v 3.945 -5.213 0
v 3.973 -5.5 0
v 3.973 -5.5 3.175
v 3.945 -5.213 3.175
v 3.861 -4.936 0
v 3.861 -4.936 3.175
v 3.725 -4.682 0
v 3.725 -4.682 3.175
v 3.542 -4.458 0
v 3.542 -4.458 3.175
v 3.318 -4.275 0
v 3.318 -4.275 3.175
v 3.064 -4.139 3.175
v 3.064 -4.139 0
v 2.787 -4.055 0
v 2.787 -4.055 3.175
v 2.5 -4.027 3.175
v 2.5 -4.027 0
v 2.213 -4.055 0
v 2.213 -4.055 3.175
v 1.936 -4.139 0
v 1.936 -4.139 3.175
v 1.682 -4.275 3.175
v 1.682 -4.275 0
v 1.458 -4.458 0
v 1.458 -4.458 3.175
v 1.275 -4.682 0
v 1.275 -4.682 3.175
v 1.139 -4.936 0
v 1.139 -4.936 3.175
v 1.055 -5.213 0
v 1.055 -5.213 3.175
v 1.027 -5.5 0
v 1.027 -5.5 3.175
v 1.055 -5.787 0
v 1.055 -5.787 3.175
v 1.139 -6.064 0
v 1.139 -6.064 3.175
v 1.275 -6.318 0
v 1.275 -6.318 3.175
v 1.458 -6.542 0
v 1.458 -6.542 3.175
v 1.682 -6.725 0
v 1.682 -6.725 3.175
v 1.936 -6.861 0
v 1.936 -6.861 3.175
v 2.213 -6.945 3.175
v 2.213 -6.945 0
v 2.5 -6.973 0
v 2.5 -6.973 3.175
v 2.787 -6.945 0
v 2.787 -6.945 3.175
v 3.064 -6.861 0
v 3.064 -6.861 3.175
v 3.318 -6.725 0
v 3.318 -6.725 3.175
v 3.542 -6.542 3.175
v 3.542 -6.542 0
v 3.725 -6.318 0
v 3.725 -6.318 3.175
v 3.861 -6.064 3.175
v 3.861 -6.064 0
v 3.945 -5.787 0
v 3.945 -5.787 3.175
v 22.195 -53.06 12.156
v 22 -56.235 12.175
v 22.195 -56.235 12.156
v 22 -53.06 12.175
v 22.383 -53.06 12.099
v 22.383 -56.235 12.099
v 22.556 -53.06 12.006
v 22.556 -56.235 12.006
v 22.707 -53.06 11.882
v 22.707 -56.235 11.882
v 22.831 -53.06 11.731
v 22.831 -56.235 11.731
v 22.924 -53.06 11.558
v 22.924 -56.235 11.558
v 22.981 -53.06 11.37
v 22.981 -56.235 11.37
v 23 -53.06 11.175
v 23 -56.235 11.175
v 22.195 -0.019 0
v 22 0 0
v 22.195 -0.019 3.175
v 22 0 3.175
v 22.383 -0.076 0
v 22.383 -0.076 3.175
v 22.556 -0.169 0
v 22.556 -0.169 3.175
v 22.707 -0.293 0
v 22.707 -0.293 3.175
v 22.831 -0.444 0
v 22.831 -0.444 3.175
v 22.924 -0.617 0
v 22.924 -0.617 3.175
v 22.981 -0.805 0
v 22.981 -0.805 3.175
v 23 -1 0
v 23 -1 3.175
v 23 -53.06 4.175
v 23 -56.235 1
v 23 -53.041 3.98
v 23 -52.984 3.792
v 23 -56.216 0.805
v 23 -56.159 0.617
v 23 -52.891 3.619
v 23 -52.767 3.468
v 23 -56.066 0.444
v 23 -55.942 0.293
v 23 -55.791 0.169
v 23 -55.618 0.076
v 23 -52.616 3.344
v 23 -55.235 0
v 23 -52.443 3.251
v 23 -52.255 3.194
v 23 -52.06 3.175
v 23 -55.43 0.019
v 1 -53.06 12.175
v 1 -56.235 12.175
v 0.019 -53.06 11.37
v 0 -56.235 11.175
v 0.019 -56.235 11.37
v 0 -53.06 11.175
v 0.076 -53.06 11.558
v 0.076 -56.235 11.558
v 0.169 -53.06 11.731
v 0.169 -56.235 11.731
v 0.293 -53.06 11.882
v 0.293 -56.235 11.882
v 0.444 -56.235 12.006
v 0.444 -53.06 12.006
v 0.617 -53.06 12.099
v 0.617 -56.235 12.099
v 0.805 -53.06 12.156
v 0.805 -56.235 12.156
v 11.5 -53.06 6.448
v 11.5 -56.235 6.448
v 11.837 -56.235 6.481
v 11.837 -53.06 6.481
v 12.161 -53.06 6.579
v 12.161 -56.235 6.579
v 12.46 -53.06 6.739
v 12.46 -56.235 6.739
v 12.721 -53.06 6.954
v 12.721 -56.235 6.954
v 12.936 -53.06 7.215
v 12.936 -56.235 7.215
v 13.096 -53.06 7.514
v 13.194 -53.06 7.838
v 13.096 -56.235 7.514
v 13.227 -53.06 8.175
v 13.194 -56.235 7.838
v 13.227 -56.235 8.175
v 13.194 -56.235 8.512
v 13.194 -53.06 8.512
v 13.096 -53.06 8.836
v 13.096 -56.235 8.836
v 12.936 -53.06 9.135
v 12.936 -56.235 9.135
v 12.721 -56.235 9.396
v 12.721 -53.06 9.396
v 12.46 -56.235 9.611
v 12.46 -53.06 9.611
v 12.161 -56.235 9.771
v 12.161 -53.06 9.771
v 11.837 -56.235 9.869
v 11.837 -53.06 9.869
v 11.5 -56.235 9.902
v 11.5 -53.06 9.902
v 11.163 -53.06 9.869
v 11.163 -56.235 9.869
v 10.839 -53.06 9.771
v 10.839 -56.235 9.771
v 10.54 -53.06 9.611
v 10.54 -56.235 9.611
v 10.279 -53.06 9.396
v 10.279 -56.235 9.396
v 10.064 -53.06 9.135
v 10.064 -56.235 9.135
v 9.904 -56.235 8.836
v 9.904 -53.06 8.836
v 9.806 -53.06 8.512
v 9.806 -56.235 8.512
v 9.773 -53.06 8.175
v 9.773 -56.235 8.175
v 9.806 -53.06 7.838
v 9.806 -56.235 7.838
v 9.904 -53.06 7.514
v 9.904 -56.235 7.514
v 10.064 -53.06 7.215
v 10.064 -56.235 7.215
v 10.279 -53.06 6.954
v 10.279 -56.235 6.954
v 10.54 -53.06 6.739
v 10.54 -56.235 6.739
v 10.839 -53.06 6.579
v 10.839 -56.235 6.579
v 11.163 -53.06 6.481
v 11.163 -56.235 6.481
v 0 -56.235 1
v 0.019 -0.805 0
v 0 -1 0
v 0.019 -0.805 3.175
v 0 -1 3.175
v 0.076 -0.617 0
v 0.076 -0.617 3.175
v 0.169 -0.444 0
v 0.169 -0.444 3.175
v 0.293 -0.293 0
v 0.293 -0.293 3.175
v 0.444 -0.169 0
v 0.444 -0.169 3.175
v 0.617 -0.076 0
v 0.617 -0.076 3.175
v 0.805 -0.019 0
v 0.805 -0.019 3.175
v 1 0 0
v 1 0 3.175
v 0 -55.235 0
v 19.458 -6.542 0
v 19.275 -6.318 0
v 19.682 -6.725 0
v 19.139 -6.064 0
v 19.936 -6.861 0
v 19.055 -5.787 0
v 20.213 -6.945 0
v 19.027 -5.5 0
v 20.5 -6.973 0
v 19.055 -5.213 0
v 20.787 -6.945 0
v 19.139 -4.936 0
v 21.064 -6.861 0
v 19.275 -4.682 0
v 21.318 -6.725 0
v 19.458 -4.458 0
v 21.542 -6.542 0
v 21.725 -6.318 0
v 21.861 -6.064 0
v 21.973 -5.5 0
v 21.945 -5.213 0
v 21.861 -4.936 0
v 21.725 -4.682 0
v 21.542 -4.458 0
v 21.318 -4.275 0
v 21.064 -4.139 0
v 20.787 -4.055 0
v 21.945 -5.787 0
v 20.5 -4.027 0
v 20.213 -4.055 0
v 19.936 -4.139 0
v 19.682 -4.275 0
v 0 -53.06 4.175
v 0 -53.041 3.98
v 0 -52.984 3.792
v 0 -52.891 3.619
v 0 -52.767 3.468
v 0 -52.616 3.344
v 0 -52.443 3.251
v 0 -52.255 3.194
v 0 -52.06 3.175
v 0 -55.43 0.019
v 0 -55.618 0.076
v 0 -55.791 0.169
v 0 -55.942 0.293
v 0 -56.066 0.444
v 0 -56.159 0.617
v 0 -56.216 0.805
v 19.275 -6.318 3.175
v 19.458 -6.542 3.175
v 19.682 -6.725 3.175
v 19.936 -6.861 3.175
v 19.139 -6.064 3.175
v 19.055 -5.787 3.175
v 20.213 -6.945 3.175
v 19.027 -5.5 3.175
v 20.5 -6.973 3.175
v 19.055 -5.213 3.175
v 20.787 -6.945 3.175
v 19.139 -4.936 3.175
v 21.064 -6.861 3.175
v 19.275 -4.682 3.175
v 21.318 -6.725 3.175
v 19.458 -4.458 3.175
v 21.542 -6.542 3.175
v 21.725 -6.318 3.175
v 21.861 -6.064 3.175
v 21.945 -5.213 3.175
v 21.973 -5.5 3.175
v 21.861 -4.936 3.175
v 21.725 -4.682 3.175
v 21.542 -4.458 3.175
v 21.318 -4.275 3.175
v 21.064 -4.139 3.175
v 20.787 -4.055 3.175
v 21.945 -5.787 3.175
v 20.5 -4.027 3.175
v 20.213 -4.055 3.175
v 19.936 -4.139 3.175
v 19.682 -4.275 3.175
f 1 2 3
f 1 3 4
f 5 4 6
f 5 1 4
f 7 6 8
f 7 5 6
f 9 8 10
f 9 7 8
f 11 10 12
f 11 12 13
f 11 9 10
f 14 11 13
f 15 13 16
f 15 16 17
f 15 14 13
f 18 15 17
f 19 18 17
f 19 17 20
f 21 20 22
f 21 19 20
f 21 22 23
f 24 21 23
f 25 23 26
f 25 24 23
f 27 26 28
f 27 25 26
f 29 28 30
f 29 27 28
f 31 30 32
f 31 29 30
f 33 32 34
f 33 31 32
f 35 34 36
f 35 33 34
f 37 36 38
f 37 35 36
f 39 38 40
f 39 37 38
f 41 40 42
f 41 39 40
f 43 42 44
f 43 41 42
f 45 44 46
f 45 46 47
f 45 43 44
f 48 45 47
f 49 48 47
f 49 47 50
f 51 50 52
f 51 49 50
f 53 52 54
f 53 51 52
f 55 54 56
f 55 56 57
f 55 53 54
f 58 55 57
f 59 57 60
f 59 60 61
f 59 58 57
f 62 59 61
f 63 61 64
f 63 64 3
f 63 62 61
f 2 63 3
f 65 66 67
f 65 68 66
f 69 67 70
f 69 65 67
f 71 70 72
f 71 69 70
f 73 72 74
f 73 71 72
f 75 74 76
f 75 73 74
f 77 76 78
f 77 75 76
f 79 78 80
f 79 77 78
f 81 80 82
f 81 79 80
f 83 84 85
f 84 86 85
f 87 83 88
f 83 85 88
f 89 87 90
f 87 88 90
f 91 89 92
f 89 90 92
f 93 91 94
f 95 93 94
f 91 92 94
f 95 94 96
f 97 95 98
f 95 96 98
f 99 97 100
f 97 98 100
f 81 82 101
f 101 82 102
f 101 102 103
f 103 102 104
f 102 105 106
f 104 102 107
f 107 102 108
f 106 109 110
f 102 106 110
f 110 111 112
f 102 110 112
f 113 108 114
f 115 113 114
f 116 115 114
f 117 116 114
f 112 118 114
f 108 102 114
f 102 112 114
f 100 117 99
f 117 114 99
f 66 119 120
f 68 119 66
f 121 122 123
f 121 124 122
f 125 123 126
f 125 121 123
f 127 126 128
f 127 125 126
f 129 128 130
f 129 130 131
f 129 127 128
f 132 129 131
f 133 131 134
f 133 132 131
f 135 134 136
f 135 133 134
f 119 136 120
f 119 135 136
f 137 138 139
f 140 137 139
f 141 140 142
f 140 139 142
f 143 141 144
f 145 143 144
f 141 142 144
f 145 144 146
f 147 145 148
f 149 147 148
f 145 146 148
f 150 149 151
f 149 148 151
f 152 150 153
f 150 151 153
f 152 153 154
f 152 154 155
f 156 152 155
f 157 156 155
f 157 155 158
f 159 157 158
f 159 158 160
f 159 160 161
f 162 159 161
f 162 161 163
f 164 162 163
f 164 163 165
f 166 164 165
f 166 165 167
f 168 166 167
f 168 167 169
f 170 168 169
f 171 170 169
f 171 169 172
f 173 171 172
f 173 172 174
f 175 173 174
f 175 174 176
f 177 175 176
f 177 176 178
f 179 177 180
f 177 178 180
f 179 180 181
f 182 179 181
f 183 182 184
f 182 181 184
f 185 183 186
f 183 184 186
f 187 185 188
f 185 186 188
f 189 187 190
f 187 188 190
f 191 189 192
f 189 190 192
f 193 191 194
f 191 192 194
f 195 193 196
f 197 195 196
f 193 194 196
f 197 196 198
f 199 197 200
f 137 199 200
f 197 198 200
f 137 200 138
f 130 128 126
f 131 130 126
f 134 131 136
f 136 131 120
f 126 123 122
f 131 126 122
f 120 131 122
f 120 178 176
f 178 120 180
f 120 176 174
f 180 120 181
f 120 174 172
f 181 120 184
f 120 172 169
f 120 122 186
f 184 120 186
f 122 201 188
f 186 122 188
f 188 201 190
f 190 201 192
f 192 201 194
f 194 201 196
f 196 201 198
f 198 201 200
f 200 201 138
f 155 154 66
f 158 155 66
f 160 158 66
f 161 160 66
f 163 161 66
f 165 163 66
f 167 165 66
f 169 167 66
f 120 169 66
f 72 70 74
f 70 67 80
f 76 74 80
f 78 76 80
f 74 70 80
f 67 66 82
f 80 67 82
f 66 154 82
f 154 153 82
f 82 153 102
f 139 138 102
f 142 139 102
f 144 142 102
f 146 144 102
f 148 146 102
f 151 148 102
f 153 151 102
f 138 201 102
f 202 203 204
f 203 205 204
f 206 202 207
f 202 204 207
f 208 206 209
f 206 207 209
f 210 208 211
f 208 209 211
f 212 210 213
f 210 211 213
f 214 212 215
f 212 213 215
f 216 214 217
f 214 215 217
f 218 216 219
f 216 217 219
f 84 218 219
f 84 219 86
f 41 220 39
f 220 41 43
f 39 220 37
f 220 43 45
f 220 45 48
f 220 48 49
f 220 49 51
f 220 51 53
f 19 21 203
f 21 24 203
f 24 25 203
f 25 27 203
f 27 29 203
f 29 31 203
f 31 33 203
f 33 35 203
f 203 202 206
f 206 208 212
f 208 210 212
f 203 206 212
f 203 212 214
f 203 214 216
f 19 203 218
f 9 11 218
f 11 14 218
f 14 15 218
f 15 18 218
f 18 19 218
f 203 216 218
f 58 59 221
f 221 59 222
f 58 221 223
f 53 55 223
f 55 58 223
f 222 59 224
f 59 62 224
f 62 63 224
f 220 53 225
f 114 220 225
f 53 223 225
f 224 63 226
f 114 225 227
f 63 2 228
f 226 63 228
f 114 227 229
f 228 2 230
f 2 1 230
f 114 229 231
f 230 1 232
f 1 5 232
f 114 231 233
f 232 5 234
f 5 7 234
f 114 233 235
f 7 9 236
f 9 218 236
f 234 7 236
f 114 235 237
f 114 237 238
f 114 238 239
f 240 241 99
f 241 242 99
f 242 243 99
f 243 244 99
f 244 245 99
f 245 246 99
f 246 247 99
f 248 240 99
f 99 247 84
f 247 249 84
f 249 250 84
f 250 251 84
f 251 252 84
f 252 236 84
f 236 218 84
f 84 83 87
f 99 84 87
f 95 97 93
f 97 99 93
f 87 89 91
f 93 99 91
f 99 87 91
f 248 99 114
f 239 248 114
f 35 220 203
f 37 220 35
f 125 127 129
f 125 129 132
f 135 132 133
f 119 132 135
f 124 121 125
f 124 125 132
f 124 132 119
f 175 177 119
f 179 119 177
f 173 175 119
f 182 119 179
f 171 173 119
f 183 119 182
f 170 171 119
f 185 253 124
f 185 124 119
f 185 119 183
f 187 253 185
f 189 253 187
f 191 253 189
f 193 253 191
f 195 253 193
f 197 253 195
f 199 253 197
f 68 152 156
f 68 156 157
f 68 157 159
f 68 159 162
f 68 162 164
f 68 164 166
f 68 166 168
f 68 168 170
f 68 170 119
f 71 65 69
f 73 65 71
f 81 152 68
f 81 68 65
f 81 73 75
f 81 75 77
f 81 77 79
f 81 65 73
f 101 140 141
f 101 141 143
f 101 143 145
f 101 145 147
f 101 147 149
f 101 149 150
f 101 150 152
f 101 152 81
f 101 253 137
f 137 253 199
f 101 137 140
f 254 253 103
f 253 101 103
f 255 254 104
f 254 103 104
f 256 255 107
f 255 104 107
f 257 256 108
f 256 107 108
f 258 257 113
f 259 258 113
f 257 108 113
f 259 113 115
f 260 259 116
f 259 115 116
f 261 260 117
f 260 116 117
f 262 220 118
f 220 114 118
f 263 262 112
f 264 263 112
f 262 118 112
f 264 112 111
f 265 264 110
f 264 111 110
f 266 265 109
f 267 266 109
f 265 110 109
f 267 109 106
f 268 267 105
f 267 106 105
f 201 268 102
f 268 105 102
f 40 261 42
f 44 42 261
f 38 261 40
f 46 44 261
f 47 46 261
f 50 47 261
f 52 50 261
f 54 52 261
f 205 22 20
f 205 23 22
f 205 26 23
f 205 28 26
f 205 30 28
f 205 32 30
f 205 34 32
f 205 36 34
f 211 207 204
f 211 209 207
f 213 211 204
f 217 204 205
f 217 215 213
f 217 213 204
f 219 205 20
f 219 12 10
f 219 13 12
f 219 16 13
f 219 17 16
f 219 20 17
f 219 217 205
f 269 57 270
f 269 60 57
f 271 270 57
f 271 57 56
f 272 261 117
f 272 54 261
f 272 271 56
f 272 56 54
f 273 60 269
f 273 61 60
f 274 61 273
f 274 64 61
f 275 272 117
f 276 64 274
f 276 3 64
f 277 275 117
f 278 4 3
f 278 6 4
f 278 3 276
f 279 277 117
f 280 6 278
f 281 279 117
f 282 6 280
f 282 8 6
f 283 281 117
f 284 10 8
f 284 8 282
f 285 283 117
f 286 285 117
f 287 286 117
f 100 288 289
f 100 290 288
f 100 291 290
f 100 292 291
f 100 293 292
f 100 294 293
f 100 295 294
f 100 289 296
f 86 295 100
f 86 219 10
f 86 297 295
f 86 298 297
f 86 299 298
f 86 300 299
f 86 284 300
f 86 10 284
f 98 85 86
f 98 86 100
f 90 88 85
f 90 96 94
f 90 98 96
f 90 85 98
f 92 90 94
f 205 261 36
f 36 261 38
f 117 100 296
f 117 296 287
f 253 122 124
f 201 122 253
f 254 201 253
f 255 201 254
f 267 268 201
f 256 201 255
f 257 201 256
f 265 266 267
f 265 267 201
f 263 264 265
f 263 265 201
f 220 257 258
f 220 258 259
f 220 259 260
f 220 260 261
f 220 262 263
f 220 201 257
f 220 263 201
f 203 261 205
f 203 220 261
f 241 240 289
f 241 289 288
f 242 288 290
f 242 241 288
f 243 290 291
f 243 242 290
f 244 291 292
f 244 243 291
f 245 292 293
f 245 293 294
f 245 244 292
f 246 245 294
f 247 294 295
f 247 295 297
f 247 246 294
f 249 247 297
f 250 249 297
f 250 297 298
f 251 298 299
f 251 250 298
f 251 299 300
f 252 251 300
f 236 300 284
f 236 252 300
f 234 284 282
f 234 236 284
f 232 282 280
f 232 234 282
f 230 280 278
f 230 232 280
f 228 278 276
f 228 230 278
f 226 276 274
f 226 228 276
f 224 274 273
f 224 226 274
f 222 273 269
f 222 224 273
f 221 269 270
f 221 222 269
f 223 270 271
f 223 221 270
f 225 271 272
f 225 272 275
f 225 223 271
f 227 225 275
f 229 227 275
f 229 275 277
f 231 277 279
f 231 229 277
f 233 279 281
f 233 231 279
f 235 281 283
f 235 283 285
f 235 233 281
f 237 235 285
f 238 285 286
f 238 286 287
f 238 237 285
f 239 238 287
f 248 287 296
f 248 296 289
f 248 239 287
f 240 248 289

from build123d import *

# Parameters (mm, degrees)
SKETCH1_W             = 23
SKETCH1_H             = 53.06
SKETCH1_R             = 1.4732
SKETCH1_H_2           = 3.175
BOSS_EXTRUDE1_DEPTH   = 3.175
BOSS_EXTRUDE2_START   = 3.175
SKETCH1_3_W           = 23
SKETCH1_3_H           = 3.175
BOSS_EXTRUDE2_DEPTH   = 9
F_8_32_TAPPED_HOLE1_D = 3.4544
FILLET1_R             = 1


with BuildPart() as part:
    # Sketch1 → Boss-Extrude1 (new body)
    # profile 1 of 2: a face of its own
    with BuildSketch(Plane.XY):
        with Locations((11.5, -26.53)):
            Rectangle(SKETCH1_W, SKETCH1_H)
        with Locations((2.5, -5.5)):
            Circle(SKETCH1_R, mode=Mode.SUBTRACT)
        with Locations((20.5, -5.5)):
            Circle(SKETCH1_R, mode=Mode.SUBTRACT)
    # profile 2 of 2: a face of its own
    with BuildSketch(Plane.XY):
        with Locations((11.5, -54.6475)):
            Rectangle(SKETCH1_W, SKETCH1_H_2)
    extrude(amount=BOSS_EXTRUDE1_DEPTH)

    # Sketch1<3> → Boss-Extrude2 (add)
    with BuildSketch(Plane.XY.offset(BOSS_EXTRUDE2_START)):
        with Locations((11.5, -54.6475)):
            Rectangle(SKETCH1_3_W, SKETCH1_3_H)
    extrude(amount=BOSS_EXTRUDE2_DEPTH)

    # #8-32 Tapped Hole1 (through all)
    with Locations(Plane(origin=(11.5, -53.06, 8.175), x_dir=(0, 0, 1), z_dir=(0, 1, 0))):
        with Locations((0, 0)):
            Hole(F_8_32_TAPPED_HOLE1_D / 2)

    # Fillet1
    fillet1_edges = [part.edges().sort_by_distance(p)[0] for p in [
        (0, 0, 1.5875),
        (23, 0, 1.5875),
        (0, -54.6475, 12.175),
        (11.5, -53.06, 3.175),
        (23, -54.6475, 12.175),
        (11.5, -56.235, 0),
    ]]
    fillet(fillet1_edges, radius=FILLET1_R)


solid = part.part
